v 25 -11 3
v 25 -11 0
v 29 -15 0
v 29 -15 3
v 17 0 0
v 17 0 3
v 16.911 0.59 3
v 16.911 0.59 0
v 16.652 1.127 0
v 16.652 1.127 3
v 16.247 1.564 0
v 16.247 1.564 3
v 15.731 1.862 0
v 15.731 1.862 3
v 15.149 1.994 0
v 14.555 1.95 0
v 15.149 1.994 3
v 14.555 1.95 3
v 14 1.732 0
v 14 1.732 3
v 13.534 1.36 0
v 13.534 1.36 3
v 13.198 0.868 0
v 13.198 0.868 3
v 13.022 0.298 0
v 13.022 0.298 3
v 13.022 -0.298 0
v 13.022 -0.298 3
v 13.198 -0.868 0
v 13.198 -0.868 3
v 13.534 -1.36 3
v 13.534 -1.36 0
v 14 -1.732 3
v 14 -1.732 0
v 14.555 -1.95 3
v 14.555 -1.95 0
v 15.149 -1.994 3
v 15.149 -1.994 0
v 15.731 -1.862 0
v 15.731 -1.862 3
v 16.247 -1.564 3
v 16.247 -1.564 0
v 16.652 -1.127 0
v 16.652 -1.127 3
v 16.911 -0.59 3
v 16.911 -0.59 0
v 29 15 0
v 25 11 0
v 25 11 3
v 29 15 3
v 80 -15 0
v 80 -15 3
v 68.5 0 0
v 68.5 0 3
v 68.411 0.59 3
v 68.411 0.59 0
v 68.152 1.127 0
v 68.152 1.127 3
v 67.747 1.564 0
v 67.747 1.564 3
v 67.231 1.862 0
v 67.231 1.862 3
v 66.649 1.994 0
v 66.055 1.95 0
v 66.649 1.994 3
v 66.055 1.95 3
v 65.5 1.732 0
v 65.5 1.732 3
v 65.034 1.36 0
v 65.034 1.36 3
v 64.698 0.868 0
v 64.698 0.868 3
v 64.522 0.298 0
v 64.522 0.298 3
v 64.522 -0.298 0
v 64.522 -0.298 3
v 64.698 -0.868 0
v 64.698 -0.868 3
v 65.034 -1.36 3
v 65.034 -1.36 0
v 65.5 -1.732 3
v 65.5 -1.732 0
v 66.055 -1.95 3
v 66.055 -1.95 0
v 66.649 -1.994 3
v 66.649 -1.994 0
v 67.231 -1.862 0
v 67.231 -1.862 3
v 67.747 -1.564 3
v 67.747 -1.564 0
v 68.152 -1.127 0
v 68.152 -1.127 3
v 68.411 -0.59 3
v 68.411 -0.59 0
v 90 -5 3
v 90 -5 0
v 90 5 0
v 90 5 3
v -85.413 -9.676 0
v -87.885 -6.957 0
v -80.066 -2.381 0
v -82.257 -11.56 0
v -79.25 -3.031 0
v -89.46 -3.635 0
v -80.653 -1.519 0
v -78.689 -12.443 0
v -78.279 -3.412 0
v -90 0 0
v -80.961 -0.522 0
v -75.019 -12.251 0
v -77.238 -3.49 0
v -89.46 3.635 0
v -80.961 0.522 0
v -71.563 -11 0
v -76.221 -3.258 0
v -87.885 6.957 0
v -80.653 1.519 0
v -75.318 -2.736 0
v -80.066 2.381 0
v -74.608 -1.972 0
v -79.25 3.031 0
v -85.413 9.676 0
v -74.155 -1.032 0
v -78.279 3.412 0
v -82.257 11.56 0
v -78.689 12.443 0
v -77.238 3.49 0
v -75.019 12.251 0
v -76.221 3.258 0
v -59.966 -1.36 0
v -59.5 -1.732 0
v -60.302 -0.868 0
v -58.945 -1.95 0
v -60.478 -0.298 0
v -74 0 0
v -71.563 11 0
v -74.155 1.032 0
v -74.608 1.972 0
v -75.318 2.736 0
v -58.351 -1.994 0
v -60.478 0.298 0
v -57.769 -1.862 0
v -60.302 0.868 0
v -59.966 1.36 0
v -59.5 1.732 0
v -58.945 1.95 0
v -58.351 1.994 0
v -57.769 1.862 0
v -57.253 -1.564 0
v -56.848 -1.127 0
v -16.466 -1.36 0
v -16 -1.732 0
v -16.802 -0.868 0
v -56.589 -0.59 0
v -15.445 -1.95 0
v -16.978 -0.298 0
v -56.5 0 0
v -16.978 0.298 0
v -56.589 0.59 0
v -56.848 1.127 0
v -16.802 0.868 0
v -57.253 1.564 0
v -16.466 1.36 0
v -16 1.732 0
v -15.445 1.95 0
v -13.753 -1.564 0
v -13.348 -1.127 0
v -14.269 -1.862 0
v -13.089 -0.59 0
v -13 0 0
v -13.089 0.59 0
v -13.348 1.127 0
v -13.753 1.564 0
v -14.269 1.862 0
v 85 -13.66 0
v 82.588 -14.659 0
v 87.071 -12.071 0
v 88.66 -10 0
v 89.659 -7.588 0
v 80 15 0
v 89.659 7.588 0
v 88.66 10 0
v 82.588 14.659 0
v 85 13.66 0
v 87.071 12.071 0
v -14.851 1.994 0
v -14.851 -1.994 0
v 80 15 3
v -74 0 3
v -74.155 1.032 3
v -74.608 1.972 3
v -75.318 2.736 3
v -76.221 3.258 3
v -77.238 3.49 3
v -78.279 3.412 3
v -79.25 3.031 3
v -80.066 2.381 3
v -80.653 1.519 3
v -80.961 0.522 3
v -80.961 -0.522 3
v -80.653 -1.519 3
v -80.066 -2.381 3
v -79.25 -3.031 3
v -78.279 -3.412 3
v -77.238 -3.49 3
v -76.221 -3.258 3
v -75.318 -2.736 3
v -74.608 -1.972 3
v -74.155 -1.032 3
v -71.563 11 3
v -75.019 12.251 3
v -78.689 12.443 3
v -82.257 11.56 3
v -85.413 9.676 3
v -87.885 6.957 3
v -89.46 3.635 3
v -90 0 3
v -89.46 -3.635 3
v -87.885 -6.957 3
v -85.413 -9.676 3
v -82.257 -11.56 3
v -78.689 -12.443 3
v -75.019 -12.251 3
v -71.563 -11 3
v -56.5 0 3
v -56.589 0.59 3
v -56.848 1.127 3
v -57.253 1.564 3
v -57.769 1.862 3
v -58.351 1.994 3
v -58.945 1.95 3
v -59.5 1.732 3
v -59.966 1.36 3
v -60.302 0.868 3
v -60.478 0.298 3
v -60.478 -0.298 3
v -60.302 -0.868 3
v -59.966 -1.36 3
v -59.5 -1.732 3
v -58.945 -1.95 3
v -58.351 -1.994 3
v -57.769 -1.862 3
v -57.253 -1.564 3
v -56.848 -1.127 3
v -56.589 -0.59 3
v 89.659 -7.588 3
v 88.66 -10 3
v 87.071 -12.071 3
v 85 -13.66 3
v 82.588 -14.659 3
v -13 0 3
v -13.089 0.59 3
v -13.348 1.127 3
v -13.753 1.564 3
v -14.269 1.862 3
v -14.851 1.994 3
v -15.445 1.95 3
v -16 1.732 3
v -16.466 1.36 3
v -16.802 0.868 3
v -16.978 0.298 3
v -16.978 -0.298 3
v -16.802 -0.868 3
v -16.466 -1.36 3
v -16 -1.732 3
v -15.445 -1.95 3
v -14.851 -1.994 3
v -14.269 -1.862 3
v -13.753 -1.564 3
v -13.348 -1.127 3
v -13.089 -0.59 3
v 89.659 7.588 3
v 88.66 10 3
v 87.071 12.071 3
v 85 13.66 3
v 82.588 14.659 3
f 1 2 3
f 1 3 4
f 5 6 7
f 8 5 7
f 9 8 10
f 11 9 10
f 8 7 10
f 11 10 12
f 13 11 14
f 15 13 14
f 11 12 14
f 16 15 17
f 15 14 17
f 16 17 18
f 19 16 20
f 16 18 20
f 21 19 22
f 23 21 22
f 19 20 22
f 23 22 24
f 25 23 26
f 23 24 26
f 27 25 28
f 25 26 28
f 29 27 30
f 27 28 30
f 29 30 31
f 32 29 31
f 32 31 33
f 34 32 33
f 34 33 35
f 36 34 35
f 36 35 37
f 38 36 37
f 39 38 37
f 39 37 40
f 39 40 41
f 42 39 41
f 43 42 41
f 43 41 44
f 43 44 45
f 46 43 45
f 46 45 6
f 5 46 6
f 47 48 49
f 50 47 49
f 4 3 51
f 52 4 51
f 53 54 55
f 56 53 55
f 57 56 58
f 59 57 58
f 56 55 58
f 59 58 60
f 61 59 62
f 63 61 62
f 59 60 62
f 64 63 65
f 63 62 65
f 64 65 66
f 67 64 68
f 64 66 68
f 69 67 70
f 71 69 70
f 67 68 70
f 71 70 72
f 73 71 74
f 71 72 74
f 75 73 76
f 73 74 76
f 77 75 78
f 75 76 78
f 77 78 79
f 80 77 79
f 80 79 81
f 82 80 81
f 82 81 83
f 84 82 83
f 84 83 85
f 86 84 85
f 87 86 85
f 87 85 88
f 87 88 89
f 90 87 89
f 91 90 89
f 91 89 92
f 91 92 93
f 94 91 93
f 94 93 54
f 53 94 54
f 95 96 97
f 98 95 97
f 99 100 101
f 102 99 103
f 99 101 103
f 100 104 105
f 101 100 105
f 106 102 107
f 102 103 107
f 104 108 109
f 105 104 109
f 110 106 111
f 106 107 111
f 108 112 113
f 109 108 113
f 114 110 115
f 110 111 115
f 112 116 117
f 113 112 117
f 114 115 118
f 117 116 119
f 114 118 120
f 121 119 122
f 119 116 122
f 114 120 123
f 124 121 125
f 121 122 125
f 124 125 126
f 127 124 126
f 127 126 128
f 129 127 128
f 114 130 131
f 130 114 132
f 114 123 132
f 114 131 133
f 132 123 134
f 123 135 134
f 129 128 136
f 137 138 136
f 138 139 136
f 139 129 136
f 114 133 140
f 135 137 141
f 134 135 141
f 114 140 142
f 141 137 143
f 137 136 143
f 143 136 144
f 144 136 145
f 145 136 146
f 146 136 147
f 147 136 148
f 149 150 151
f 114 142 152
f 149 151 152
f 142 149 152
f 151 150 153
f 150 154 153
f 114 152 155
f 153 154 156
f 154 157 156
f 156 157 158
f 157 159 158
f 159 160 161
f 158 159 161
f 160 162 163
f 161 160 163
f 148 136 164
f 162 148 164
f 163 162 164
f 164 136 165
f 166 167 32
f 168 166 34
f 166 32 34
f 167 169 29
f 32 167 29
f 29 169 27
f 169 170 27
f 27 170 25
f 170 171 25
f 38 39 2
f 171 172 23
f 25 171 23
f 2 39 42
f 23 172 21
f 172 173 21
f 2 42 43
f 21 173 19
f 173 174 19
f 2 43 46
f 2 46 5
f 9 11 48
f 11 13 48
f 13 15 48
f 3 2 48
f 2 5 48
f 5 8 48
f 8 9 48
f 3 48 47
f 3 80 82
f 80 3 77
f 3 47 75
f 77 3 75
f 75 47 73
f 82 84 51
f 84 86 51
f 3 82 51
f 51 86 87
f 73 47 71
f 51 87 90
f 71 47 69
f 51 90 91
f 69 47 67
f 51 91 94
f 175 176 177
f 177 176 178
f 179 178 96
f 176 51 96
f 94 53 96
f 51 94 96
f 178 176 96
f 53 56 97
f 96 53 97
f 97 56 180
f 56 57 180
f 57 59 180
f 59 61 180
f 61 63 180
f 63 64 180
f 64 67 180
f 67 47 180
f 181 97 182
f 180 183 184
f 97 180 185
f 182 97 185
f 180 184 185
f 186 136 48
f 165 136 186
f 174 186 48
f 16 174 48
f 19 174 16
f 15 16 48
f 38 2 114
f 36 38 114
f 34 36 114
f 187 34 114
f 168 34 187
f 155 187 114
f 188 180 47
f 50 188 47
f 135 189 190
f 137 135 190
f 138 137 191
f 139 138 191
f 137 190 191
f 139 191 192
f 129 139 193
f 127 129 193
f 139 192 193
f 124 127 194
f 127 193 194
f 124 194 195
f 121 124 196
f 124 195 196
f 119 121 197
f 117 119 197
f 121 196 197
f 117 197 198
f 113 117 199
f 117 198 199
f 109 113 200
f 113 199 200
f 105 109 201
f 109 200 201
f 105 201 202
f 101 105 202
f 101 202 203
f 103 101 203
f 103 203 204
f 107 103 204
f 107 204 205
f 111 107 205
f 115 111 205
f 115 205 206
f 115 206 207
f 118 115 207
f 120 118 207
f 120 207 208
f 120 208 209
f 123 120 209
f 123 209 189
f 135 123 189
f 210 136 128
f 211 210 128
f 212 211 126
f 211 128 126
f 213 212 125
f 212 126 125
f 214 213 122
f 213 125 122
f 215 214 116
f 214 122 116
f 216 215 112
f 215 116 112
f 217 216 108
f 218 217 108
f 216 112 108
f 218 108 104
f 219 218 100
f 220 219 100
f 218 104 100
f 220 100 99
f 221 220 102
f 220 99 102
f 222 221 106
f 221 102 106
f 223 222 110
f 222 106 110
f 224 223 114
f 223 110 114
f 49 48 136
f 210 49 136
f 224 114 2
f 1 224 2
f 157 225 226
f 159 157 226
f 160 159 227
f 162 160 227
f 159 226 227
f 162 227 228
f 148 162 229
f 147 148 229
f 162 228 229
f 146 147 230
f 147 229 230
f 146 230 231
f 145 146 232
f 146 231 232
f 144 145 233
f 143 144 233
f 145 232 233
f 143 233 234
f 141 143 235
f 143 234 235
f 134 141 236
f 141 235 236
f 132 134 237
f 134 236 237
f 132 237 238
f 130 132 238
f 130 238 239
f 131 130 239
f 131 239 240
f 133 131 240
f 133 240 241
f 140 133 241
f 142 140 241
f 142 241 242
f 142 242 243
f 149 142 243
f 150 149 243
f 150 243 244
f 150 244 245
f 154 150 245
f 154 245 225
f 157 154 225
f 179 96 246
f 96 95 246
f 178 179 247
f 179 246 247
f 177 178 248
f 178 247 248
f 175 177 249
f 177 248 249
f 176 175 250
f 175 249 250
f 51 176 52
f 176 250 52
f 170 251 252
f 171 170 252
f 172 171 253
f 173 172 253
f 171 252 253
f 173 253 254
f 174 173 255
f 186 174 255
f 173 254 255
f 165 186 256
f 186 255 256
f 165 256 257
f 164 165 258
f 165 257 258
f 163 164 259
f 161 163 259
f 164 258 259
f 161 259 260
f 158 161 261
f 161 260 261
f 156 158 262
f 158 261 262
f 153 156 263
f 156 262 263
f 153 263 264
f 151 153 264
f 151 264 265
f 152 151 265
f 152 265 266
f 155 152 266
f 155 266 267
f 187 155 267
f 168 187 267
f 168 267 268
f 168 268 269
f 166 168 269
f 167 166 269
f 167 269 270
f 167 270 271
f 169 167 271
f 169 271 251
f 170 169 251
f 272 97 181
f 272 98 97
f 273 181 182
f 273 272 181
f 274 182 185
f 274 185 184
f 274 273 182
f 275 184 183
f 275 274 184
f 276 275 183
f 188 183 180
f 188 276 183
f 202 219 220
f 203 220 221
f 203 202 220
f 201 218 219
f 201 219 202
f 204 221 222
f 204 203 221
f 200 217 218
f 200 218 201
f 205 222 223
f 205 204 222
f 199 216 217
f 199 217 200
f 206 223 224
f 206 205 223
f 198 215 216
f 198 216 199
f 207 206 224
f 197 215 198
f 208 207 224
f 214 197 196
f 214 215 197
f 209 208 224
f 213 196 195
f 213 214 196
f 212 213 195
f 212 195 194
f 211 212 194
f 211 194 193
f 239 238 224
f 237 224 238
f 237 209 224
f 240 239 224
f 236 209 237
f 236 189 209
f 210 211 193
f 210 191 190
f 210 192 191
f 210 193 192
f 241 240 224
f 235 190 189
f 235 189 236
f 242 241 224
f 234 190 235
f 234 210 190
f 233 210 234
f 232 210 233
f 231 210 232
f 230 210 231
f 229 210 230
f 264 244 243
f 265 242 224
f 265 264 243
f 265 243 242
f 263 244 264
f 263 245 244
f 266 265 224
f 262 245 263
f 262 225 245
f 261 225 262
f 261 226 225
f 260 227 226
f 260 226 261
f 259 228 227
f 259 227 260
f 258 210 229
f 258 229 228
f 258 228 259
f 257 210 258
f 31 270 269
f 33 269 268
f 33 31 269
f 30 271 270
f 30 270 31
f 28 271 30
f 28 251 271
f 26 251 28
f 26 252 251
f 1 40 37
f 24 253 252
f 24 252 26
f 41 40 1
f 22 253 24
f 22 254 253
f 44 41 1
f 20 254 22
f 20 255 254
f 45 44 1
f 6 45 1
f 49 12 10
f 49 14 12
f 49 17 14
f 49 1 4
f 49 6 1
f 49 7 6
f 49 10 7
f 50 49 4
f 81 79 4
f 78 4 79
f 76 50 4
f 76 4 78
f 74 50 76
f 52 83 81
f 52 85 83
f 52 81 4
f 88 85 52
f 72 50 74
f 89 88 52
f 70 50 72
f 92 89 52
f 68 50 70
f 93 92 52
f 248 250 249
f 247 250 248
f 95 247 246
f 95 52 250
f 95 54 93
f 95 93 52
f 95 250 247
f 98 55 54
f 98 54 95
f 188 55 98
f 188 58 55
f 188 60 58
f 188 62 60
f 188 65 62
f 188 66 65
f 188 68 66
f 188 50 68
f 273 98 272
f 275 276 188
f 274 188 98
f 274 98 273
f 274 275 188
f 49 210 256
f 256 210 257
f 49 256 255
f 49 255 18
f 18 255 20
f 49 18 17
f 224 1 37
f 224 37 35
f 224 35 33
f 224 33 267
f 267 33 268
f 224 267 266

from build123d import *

# Parameters (mm, degrees)
SALIENTE_EXTRUIR1_DEPTH = 3
REDONDEO1_R             = 10
CHAFL_N1_SIZE           = 4
CORTAR_EXTRUIR2_REACH   = 93.291
CROQUIS3_R              = 3.5
CROQUIS3_R_2            = 2
CORTAR_EXTRUIR3_REACH   = 93.291
CROQUIS4_R              = 2
CORTAR_EXTRUIR4_REACH   = 93.291
CROQUIS2_R              = 2


with BuildPart() as part:
    # Croquis1 → Saliente-Extruir1 (new body)
    with BuildSketch(Plane.XY):
        with BuildLine():
            Line((90, -15), (90, 15))
            Line((90, 15), (25, 15))
            Line((25, 15), (25, 11))
            Line((25, 11), (-25, 11))
            Line((-25, 11), (-71.562828956, 11))
            ThreePointArc((-71.562828956, 11), (-90, 0), (-71.562828956, -11))
            Line((-71.562828956, -11), (-25, -11))
            Line((-25, -11), (25, -11))
            Line((25, -11), (25, -15))
            Line((25, -15), (90, -15))
        make_face()
    extrude(amount=SALIENTE_EXTRUIR1_DEPTH)

    # Redondeo1
    redondeo1_edges = [part.edges().sort_by_distance(p)[0] for p in [
        (90, 15, 1.5),
        (90, -15, 1.5),
    ]]
    fillet(redondeo1_edges, radius=REDONDEO1_R)

    # Chaflán1
    chafl_n1_edges = [part.edges().sort_by_distance(p)[0] for p in [
        (25, -15, 1.5),
        (25, 15, 1.5),
    ]]
    chamfer(chafl_n1_edges, length=CHAFL_N1_SIZE - 0.0001)  # a hair under: the kernel refuses the full size

    # Croquis3 → Cortar-Extruir2 (cut, up to next)
    with BuildSketch(Plane.XY.offset(3), mode=Mode.PRIVATE) as cortar_extruir2_sk1:
        with Locations((-77.5, 0)):
            Circle(CROQUIS3_R)
    cortar_extruir2_tool1 = extrude(cortar_extruir2_sk1.sketch, amount=-CORTAR_EXTRUIR2_REACH, mode=Mode.PRIVATE) & part.part
    # Croquis3 → Cortar-Extruir2 (cut, up to next)
    with BuildSketch(Plane.XY.offset(3), mode=Mode.PRIVATE) as cortar_extruir2_sk2:
        with Locations((-58.5, 0)):
            Circle(CROQUIS3_R_2)
    cortar_extruir2_tool2 = extrude(cortar_extruir2_sk2.sketch, amount=-CORTAR_EXTRUIR2_REACH, mode=Mode.PRIVATE) & part.part
    add(cortar_extruir2_tool1.solids().sort_by_distance((-77.5, 0, 3))[0], mode=Mode.SUBTRACT)
    add(cortar_extruir2_tool2.solids().sort_by_distance((-58.5, 0, 3))[0], mode=Mode.SUBTRACT)

    # Croquis4 → Cortar-Extruir3 (cut, up to next)
    with BuildSketch(Plane.XY.offset(3), mode=Mode.PRIVATE) as cortar_extruir3_sk1:
        with Locations((-15, 0)):
            Circle(CROQUIS4_R)
    cortar_extruir3_tool1 = extrude(cortar_extruir3_sk1.sketch, amount=-CORTAR_EXTRUIR3_REACH, mode=Mode.PRIVATE) & part.part
    # Croquis4 → Cortar-Extruir3 (cut, up to next)
    with BuildSketch(Plane.XY.offset(3), mode=Mode.PRIVATE) as cortar_extruir3_sk2:
        with Locations((15, 0)):
            Circle(CROQUIS4_R)
    cortar_extruir3_tool2 = extrude(cortar_extruir3_sk2.sketch, amount=-CORTAR_EXTRUIR3_REACH, mode=Mode.PRIVATE) & part.part
    add(cortar_extruir3_tool1.solids().sort_by_distance((-15, 0, 3))[0], mode=Mode.SUBTRACT)
    add(cortar_extruir3_tool2.solids().sort_by_distance((15, 0, 3))[0], mode=Mode.SUBTRACT)

    # Croquis2 → Cortar-Extruir4 (cut, up to next)
    with BuildSketch(Plane.XY.offset(3), mode=Mode.PRIVATE) as cortar_extruir4_sk1:
        with Locations((66.5, 0)):
            Circle(CROQUIS2_R)
    cortar_extruir4_tool1 = extrude(cortar_extruir4_sk1.sketch, amount=-CORTAR_EXTRUIR4_REACH, mode=Mode.PRIVATE) & part.part
    add(cortar_extruir4_tool1.solids().sort_by_distance((66.5, 0, 3))[0], mode=Mode.SUBTRACT)


solid = part.part
